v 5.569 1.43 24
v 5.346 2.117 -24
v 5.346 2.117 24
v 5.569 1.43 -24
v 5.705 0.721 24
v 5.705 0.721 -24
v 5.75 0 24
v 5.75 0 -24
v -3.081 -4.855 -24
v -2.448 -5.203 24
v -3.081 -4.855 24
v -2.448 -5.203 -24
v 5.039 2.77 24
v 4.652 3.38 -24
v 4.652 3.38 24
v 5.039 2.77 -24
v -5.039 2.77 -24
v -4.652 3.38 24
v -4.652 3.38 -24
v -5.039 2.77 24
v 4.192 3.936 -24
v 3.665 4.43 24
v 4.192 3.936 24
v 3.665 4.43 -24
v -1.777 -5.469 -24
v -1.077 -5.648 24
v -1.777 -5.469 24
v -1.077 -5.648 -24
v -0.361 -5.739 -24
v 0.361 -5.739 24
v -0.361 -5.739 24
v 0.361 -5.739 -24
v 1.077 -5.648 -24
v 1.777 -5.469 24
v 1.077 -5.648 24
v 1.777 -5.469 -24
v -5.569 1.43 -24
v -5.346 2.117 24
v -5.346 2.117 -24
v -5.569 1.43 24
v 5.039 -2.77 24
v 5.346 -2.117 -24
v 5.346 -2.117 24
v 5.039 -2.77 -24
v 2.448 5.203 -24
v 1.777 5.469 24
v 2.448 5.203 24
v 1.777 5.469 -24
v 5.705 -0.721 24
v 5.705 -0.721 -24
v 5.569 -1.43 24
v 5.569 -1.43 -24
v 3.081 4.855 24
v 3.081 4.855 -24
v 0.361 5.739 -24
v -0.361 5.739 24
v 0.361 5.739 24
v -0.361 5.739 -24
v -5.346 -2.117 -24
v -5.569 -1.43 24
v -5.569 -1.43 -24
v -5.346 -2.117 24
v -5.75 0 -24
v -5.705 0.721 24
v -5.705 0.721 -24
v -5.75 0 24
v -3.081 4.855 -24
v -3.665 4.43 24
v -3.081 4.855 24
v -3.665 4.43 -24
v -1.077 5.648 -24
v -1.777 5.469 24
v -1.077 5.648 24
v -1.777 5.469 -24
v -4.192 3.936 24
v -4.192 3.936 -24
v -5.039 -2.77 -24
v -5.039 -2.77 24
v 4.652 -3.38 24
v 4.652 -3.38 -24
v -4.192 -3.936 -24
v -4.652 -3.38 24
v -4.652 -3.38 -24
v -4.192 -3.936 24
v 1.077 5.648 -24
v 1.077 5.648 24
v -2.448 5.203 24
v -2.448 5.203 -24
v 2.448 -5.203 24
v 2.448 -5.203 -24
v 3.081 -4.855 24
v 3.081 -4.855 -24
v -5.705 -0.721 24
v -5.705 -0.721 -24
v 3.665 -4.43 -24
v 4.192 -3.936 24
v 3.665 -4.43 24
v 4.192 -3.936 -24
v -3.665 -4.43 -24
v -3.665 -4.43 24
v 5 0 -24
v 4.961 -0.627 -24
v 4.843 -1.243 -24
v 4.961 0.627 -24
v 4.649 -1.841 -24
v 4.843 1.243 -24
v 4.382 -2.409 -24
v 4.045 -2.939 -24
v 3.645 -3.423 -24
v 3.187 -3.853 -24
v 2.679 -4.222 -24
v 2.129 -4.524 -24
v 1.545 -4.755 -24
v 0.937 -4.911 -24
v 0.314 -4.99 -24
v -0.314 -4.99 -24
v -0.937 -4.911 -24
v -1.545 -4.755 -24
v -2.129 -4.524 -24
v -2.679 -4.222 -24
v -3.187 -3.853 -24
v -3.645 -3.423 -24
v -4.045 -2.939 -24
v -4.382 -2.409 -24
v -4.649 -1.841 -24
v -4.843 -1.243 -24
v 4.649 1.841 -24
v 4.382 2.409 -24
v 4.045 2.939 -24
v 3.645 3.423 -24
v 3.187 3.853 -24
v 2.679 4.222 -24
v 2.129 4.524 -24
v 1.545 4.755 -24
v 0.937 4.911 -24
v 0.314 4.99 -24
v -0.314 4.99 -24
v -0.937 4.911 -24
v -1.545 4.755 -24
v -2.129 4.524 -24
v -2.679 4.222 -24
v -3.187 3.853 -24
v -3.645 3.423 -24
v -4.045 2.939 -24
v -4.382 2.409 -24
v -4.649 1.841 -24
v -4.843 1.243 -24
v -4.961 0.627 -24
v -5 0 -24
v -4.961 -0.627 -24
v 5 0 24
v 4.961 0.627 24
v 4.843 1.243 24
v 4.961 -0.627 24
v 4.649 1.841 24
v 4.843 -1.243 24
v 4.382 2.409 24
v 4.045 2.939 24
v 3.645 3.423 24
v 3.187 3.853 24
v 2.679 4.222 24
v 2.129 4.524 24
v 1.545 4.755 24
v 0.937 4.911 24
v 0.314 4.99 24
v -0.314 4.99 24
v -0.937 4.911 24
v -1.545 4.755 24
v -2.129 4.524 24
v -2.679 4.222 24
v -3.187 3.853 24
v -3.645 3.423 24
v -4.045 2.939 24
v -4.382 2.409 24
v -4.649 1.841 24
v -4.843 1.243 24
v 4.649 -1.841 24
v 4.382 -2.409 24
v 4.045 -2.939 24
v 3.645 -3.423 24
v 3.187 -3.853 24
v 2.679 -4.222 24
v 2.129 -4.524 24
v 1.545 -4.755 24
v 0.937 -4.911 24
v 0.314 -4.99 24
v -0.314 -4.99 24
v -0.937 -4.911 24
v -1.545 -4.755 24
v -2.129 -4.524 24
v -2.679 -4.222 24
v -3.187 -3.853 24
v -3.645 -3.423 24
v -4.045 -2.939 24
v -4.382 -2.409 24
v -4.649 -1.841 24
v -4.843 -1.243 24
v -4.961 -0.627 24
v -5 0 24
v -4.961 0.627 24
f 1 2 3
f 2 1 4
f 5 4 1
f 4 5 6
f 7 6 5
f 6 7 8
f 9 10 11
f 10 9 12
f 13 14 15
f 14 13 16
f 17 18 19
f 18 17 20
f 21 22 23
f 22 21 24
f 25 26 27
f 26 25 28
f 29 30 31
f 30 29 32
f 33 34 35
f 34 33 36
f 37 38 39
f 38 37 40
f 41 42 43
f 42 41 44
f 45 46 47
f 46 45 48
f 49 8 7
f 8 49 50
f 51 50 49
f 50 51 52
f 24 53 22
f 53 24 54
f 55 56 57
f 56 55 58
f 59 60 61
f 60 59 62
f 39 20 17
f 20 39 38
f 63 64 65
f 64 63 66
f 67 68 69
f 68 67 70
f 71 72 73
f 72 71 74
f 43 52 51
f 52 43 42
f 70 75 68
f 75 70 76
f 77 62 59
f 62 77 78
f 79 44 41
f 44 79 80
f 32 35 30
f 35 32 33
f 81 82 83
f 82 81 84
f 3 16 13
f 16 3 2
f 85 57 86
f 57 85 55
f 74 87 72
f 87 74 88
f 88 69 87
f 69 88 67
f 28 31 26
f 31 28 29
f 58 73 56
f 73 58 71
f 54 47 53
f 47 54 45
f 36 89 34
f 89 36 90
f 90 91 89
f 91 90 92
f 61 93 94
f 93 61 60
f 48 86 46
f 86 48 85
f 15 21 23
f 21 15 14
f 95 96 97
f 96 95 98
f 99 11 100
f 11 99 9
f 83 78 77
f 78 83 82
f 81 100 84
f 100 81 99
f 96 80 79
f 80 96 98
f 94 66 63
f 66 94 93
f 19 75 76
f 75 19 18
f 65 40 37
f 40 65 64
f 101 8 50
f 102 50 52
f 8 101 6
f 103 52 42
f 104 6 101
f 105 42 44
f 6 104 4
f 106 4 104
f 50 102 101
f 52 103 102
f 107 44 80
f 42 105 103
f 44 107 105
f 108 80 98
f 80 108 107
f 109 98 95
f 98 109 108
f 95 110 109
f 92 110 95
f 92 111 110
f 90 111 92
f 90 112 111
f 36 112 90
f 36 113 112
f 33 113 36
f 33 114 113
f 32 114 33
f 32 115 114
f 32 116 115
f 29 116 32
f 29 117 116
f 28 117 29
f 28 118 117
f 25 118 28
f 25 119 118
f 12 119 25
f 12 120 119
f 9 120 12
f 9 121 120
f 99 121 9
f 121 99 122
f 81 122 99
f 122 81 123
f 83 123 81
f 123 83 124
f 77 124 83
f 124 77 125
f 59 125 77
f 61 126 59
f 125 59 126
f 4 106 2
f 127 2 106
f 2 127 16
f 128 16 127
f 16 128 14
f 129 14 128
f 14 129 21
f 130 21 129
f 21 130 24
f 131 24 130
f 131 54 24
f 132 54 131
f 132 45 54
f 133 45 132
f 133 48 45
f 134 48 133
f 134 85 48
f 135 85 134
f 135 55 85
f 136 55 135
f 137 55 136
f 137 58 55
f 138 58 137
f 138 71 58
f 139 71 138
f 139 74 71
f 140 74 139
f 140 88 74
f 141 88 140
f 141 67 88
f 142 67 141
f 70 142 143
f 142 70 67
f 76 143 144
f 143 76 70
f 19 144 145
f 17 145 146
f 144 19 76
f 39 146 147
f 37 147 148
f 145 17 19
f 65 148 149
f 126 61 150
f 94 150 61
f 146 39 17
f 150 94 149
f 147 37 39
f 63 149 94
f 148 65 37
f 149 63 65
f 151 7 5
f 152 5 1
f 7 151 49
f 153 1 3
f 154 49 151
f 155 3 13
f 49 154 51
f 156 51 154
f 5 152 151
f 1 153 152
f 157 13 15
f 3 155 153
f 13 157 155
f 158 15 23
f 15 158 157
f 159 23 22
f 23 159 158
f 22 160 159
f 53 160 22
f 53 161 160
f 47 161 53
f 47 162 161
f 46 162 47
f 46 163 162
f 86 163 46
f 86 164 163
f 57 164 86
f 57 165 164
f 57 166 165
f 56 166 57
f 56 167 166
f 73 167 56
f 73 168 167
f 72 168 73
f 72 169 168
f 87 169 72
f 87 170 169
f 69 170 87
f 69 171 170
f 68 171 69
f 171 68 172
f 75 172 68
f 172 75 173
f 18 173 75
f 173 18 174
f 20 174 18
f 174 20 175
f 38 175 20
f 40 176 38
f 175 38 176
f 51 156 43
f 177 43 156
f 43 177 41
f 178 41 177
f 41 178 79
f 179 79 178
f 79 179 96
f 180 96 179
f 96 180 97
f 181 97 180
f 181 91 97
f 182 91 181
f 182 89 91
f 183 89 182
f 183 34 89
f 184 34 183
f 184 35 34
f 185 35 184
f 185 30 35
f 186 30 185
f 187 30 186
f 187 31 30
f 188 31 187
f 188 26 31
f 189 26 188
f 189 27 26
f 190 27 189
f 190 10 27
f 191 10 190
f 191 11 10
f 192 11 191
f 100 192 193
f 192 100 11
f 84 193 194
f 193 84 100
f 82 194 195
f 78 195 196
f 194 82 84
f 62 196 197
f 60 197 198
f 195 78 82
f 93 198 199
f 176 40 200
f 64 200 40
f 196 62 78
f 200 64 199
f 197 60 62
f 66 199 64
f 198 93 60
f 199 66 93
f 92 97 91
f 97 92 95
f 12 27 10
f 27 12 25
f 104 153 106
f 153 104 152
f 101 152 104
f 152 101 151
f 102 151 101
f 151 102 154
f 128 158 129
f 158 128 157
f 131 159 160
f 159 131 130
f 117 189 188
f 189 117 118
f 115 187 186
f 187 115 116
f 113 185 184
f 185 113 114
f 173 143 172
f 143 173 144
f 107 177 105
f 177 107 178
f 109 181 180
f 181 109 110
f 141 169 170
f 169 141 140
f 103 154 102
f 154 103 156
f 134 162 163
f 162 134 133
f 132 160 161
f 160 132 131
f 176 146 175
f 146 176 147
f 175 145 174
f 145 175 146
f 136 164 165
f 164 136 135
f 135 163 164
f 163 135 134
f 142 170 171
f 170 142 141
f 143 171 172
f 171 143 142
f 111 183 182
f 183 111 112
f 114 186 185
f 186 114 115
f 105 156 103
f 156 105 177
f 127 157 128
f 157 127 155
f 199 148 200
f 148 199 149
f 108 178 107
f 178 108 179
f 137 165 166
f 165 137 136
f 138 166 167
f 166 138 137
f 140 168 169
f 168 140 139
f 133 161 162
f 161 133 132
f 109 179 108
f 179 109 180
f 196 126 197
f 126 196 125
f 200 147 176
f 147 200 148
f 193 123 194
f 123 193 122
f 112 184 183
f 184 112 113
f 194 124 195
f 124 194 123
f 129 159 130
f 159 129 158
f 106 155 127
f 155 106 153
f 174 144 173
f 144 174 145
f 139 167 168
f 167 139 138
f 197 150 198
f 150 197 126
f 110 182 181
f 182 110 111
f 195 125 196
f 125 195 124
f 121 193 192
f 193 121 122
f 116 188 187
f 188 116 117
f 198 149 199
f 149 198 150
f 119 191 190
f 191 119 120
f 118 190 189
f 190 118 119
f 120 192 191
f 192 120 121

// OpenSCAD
$fn = 50;


difference() {
	union() {
		translate(v = [0, 0, -24.0000000000]) {
			cylinder(h = 48, r = 5.7500000000);
		}
	}
	union() {
		translate(v = [0, 0, -100.0000000000]) {
			cylinder(h = 200, r = 5.0000000000);
		}
	}
}
